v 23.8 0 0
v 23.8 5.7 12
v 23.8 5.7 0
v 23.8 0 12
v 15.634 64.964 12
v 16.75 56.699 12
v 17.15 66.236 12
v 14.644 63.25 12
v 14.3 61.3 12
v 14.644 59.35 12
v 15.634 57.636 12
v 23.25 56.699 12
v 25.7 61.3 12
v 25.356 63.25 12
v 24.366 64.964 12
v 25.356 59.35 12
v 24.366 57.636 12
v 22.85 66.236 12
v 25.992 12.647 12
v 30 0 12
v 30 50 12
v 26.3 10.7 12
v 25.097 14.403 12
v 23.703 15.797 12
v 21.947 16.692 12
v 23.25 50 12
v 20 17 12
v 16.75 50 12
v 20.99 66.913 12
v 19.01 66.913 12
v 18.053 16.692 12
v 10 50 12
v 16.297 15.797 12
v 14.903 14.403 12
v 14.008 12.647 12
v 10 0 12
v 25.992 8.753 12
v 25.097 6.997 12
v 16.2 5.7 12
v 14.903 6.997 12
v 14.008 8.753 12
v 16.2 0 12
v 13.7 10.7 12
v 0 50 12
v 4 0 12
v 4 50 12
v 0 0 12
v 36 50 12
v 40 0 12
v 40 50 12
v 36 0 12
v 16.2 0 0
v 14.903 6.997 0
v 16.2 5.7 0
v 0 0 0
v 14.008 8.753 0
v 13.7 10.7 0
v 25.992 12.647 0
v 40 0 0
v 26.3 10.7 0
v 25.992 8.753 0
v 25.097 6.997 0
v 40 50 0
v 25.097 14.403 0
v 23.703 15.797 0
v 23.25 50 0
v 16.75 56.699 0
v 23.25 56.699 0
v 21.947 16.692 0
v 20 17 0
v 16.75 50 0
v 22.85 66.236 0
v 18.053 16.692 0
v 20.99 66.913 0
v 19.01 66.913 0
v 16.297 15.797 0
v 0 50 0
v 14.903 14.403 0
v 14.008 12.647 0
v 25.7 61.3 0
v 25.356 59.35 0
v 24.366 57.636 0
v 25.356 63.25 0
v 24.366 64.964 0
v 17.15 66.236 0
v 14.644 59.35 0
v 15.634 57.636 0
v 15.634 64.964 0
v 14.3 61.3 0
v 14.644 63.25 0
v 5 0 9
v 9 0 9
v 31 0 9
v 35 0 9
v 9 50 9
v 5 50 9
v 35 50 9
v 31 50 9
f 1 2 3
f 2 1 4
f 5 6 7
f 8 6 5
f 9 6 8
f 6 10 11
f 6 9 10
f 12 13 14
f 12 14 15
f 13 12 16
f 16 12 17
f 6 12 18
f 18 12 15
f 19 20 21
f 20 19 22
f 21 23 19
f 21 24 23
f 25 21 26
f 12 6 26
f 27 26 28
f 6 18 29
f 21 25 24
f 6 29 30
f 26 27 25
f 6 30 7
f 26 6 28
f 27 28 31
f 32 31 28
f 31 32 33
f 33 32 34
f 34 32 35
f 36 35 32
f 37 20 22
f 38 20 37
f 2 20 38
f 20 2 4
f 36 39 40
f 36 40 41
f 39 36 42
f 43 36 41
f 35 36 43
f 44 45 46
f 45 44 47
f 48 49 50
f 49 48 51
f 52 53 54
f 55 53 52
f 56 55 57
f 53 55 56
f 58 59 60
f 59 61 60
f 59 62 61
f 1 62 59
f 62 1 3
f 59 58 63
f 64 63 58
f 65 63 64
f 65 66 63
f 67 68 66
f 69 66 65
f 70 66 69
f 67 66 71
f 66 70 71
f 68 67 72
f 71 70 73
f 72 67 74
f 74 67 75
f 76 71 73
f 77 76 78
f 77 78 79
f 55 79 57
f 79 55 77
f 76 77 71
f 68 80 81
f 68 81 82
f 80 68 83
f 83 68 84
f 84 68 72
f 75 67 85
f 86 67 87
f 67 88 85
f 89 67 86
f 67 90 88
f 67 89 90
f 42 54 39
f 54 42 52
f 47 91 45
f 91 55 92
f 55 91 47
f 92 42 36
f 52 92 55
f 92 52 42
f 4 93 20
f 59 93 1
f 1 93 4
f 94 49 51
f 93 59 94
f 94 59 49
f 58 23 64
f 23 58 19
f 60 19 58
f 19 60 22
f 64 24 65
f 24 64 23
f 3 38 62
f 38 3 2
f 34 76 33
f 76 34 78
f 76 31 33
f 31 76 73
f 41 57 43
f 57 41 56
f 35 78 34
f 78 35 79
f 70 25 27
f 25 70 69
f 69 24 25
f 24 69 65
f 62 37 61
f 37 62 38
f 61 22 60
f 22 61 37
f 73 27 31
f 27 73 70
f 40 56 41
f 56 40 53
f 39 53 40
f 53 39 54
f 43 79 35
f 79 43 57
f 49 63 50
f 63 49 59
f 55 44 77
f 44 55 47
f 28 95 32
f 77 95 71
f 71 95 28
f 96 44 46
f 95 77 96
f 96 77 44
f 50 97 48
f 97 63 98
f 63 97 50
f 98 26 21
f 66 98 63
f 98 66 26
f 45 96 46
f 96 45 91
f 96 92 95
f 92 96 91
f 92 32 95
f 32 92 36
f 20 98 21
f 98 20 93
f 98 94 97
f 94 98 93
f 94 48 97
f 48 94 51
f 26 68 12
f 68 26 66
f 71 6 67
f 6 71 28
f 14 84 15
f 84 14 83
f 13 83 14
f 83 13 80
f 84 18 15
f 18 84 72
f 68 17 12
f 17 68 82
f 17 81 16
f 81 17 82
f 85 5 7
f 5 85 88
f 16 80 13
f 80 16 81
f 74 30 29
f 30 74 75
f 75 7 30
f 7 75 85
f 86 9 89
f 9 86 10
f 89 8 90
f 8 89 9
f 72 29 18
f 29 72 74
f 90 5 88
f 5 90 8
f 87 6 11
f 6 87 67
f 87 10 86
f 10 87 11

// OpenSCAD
railway_length = 50;
railway_width = 40; // Don't change this
railway_height = 12;

module key(cylinder_d, length_total, stem_width) {   
    union() {
        translate([-stem_width/2, 0, 0])
            cube([stem_width, 10, railway_height]);
        translate([0, length_total-(cylinder_d/2)])
            cylinder(d=cylinder_d, h=railway_height);
    }
    
}

module rail() {
    linear_extrude(3, scale=[6/4, 1])
        translate([-2, 0, 0])
            square([4, railway_length]);
}

module railway() {
    difference() {
        // Base
        cube([railway_width, railway_length, railway_height]);
        
        // Rails
        translate([7,0,9]) rail();
        translate([33,0,9]) rail();
        
        // Socket
        translate([railway_width/2, 0, 0])
            key(cylinder_d = 12.6, length_total = 17, stem_width = 7.6);


    }
    // Plug
    translate([railway_width/2, railway_length, 0])
        key(cylinder_d = 11.4, length_total = 17, stem_width = 6.5);
}

railway();
